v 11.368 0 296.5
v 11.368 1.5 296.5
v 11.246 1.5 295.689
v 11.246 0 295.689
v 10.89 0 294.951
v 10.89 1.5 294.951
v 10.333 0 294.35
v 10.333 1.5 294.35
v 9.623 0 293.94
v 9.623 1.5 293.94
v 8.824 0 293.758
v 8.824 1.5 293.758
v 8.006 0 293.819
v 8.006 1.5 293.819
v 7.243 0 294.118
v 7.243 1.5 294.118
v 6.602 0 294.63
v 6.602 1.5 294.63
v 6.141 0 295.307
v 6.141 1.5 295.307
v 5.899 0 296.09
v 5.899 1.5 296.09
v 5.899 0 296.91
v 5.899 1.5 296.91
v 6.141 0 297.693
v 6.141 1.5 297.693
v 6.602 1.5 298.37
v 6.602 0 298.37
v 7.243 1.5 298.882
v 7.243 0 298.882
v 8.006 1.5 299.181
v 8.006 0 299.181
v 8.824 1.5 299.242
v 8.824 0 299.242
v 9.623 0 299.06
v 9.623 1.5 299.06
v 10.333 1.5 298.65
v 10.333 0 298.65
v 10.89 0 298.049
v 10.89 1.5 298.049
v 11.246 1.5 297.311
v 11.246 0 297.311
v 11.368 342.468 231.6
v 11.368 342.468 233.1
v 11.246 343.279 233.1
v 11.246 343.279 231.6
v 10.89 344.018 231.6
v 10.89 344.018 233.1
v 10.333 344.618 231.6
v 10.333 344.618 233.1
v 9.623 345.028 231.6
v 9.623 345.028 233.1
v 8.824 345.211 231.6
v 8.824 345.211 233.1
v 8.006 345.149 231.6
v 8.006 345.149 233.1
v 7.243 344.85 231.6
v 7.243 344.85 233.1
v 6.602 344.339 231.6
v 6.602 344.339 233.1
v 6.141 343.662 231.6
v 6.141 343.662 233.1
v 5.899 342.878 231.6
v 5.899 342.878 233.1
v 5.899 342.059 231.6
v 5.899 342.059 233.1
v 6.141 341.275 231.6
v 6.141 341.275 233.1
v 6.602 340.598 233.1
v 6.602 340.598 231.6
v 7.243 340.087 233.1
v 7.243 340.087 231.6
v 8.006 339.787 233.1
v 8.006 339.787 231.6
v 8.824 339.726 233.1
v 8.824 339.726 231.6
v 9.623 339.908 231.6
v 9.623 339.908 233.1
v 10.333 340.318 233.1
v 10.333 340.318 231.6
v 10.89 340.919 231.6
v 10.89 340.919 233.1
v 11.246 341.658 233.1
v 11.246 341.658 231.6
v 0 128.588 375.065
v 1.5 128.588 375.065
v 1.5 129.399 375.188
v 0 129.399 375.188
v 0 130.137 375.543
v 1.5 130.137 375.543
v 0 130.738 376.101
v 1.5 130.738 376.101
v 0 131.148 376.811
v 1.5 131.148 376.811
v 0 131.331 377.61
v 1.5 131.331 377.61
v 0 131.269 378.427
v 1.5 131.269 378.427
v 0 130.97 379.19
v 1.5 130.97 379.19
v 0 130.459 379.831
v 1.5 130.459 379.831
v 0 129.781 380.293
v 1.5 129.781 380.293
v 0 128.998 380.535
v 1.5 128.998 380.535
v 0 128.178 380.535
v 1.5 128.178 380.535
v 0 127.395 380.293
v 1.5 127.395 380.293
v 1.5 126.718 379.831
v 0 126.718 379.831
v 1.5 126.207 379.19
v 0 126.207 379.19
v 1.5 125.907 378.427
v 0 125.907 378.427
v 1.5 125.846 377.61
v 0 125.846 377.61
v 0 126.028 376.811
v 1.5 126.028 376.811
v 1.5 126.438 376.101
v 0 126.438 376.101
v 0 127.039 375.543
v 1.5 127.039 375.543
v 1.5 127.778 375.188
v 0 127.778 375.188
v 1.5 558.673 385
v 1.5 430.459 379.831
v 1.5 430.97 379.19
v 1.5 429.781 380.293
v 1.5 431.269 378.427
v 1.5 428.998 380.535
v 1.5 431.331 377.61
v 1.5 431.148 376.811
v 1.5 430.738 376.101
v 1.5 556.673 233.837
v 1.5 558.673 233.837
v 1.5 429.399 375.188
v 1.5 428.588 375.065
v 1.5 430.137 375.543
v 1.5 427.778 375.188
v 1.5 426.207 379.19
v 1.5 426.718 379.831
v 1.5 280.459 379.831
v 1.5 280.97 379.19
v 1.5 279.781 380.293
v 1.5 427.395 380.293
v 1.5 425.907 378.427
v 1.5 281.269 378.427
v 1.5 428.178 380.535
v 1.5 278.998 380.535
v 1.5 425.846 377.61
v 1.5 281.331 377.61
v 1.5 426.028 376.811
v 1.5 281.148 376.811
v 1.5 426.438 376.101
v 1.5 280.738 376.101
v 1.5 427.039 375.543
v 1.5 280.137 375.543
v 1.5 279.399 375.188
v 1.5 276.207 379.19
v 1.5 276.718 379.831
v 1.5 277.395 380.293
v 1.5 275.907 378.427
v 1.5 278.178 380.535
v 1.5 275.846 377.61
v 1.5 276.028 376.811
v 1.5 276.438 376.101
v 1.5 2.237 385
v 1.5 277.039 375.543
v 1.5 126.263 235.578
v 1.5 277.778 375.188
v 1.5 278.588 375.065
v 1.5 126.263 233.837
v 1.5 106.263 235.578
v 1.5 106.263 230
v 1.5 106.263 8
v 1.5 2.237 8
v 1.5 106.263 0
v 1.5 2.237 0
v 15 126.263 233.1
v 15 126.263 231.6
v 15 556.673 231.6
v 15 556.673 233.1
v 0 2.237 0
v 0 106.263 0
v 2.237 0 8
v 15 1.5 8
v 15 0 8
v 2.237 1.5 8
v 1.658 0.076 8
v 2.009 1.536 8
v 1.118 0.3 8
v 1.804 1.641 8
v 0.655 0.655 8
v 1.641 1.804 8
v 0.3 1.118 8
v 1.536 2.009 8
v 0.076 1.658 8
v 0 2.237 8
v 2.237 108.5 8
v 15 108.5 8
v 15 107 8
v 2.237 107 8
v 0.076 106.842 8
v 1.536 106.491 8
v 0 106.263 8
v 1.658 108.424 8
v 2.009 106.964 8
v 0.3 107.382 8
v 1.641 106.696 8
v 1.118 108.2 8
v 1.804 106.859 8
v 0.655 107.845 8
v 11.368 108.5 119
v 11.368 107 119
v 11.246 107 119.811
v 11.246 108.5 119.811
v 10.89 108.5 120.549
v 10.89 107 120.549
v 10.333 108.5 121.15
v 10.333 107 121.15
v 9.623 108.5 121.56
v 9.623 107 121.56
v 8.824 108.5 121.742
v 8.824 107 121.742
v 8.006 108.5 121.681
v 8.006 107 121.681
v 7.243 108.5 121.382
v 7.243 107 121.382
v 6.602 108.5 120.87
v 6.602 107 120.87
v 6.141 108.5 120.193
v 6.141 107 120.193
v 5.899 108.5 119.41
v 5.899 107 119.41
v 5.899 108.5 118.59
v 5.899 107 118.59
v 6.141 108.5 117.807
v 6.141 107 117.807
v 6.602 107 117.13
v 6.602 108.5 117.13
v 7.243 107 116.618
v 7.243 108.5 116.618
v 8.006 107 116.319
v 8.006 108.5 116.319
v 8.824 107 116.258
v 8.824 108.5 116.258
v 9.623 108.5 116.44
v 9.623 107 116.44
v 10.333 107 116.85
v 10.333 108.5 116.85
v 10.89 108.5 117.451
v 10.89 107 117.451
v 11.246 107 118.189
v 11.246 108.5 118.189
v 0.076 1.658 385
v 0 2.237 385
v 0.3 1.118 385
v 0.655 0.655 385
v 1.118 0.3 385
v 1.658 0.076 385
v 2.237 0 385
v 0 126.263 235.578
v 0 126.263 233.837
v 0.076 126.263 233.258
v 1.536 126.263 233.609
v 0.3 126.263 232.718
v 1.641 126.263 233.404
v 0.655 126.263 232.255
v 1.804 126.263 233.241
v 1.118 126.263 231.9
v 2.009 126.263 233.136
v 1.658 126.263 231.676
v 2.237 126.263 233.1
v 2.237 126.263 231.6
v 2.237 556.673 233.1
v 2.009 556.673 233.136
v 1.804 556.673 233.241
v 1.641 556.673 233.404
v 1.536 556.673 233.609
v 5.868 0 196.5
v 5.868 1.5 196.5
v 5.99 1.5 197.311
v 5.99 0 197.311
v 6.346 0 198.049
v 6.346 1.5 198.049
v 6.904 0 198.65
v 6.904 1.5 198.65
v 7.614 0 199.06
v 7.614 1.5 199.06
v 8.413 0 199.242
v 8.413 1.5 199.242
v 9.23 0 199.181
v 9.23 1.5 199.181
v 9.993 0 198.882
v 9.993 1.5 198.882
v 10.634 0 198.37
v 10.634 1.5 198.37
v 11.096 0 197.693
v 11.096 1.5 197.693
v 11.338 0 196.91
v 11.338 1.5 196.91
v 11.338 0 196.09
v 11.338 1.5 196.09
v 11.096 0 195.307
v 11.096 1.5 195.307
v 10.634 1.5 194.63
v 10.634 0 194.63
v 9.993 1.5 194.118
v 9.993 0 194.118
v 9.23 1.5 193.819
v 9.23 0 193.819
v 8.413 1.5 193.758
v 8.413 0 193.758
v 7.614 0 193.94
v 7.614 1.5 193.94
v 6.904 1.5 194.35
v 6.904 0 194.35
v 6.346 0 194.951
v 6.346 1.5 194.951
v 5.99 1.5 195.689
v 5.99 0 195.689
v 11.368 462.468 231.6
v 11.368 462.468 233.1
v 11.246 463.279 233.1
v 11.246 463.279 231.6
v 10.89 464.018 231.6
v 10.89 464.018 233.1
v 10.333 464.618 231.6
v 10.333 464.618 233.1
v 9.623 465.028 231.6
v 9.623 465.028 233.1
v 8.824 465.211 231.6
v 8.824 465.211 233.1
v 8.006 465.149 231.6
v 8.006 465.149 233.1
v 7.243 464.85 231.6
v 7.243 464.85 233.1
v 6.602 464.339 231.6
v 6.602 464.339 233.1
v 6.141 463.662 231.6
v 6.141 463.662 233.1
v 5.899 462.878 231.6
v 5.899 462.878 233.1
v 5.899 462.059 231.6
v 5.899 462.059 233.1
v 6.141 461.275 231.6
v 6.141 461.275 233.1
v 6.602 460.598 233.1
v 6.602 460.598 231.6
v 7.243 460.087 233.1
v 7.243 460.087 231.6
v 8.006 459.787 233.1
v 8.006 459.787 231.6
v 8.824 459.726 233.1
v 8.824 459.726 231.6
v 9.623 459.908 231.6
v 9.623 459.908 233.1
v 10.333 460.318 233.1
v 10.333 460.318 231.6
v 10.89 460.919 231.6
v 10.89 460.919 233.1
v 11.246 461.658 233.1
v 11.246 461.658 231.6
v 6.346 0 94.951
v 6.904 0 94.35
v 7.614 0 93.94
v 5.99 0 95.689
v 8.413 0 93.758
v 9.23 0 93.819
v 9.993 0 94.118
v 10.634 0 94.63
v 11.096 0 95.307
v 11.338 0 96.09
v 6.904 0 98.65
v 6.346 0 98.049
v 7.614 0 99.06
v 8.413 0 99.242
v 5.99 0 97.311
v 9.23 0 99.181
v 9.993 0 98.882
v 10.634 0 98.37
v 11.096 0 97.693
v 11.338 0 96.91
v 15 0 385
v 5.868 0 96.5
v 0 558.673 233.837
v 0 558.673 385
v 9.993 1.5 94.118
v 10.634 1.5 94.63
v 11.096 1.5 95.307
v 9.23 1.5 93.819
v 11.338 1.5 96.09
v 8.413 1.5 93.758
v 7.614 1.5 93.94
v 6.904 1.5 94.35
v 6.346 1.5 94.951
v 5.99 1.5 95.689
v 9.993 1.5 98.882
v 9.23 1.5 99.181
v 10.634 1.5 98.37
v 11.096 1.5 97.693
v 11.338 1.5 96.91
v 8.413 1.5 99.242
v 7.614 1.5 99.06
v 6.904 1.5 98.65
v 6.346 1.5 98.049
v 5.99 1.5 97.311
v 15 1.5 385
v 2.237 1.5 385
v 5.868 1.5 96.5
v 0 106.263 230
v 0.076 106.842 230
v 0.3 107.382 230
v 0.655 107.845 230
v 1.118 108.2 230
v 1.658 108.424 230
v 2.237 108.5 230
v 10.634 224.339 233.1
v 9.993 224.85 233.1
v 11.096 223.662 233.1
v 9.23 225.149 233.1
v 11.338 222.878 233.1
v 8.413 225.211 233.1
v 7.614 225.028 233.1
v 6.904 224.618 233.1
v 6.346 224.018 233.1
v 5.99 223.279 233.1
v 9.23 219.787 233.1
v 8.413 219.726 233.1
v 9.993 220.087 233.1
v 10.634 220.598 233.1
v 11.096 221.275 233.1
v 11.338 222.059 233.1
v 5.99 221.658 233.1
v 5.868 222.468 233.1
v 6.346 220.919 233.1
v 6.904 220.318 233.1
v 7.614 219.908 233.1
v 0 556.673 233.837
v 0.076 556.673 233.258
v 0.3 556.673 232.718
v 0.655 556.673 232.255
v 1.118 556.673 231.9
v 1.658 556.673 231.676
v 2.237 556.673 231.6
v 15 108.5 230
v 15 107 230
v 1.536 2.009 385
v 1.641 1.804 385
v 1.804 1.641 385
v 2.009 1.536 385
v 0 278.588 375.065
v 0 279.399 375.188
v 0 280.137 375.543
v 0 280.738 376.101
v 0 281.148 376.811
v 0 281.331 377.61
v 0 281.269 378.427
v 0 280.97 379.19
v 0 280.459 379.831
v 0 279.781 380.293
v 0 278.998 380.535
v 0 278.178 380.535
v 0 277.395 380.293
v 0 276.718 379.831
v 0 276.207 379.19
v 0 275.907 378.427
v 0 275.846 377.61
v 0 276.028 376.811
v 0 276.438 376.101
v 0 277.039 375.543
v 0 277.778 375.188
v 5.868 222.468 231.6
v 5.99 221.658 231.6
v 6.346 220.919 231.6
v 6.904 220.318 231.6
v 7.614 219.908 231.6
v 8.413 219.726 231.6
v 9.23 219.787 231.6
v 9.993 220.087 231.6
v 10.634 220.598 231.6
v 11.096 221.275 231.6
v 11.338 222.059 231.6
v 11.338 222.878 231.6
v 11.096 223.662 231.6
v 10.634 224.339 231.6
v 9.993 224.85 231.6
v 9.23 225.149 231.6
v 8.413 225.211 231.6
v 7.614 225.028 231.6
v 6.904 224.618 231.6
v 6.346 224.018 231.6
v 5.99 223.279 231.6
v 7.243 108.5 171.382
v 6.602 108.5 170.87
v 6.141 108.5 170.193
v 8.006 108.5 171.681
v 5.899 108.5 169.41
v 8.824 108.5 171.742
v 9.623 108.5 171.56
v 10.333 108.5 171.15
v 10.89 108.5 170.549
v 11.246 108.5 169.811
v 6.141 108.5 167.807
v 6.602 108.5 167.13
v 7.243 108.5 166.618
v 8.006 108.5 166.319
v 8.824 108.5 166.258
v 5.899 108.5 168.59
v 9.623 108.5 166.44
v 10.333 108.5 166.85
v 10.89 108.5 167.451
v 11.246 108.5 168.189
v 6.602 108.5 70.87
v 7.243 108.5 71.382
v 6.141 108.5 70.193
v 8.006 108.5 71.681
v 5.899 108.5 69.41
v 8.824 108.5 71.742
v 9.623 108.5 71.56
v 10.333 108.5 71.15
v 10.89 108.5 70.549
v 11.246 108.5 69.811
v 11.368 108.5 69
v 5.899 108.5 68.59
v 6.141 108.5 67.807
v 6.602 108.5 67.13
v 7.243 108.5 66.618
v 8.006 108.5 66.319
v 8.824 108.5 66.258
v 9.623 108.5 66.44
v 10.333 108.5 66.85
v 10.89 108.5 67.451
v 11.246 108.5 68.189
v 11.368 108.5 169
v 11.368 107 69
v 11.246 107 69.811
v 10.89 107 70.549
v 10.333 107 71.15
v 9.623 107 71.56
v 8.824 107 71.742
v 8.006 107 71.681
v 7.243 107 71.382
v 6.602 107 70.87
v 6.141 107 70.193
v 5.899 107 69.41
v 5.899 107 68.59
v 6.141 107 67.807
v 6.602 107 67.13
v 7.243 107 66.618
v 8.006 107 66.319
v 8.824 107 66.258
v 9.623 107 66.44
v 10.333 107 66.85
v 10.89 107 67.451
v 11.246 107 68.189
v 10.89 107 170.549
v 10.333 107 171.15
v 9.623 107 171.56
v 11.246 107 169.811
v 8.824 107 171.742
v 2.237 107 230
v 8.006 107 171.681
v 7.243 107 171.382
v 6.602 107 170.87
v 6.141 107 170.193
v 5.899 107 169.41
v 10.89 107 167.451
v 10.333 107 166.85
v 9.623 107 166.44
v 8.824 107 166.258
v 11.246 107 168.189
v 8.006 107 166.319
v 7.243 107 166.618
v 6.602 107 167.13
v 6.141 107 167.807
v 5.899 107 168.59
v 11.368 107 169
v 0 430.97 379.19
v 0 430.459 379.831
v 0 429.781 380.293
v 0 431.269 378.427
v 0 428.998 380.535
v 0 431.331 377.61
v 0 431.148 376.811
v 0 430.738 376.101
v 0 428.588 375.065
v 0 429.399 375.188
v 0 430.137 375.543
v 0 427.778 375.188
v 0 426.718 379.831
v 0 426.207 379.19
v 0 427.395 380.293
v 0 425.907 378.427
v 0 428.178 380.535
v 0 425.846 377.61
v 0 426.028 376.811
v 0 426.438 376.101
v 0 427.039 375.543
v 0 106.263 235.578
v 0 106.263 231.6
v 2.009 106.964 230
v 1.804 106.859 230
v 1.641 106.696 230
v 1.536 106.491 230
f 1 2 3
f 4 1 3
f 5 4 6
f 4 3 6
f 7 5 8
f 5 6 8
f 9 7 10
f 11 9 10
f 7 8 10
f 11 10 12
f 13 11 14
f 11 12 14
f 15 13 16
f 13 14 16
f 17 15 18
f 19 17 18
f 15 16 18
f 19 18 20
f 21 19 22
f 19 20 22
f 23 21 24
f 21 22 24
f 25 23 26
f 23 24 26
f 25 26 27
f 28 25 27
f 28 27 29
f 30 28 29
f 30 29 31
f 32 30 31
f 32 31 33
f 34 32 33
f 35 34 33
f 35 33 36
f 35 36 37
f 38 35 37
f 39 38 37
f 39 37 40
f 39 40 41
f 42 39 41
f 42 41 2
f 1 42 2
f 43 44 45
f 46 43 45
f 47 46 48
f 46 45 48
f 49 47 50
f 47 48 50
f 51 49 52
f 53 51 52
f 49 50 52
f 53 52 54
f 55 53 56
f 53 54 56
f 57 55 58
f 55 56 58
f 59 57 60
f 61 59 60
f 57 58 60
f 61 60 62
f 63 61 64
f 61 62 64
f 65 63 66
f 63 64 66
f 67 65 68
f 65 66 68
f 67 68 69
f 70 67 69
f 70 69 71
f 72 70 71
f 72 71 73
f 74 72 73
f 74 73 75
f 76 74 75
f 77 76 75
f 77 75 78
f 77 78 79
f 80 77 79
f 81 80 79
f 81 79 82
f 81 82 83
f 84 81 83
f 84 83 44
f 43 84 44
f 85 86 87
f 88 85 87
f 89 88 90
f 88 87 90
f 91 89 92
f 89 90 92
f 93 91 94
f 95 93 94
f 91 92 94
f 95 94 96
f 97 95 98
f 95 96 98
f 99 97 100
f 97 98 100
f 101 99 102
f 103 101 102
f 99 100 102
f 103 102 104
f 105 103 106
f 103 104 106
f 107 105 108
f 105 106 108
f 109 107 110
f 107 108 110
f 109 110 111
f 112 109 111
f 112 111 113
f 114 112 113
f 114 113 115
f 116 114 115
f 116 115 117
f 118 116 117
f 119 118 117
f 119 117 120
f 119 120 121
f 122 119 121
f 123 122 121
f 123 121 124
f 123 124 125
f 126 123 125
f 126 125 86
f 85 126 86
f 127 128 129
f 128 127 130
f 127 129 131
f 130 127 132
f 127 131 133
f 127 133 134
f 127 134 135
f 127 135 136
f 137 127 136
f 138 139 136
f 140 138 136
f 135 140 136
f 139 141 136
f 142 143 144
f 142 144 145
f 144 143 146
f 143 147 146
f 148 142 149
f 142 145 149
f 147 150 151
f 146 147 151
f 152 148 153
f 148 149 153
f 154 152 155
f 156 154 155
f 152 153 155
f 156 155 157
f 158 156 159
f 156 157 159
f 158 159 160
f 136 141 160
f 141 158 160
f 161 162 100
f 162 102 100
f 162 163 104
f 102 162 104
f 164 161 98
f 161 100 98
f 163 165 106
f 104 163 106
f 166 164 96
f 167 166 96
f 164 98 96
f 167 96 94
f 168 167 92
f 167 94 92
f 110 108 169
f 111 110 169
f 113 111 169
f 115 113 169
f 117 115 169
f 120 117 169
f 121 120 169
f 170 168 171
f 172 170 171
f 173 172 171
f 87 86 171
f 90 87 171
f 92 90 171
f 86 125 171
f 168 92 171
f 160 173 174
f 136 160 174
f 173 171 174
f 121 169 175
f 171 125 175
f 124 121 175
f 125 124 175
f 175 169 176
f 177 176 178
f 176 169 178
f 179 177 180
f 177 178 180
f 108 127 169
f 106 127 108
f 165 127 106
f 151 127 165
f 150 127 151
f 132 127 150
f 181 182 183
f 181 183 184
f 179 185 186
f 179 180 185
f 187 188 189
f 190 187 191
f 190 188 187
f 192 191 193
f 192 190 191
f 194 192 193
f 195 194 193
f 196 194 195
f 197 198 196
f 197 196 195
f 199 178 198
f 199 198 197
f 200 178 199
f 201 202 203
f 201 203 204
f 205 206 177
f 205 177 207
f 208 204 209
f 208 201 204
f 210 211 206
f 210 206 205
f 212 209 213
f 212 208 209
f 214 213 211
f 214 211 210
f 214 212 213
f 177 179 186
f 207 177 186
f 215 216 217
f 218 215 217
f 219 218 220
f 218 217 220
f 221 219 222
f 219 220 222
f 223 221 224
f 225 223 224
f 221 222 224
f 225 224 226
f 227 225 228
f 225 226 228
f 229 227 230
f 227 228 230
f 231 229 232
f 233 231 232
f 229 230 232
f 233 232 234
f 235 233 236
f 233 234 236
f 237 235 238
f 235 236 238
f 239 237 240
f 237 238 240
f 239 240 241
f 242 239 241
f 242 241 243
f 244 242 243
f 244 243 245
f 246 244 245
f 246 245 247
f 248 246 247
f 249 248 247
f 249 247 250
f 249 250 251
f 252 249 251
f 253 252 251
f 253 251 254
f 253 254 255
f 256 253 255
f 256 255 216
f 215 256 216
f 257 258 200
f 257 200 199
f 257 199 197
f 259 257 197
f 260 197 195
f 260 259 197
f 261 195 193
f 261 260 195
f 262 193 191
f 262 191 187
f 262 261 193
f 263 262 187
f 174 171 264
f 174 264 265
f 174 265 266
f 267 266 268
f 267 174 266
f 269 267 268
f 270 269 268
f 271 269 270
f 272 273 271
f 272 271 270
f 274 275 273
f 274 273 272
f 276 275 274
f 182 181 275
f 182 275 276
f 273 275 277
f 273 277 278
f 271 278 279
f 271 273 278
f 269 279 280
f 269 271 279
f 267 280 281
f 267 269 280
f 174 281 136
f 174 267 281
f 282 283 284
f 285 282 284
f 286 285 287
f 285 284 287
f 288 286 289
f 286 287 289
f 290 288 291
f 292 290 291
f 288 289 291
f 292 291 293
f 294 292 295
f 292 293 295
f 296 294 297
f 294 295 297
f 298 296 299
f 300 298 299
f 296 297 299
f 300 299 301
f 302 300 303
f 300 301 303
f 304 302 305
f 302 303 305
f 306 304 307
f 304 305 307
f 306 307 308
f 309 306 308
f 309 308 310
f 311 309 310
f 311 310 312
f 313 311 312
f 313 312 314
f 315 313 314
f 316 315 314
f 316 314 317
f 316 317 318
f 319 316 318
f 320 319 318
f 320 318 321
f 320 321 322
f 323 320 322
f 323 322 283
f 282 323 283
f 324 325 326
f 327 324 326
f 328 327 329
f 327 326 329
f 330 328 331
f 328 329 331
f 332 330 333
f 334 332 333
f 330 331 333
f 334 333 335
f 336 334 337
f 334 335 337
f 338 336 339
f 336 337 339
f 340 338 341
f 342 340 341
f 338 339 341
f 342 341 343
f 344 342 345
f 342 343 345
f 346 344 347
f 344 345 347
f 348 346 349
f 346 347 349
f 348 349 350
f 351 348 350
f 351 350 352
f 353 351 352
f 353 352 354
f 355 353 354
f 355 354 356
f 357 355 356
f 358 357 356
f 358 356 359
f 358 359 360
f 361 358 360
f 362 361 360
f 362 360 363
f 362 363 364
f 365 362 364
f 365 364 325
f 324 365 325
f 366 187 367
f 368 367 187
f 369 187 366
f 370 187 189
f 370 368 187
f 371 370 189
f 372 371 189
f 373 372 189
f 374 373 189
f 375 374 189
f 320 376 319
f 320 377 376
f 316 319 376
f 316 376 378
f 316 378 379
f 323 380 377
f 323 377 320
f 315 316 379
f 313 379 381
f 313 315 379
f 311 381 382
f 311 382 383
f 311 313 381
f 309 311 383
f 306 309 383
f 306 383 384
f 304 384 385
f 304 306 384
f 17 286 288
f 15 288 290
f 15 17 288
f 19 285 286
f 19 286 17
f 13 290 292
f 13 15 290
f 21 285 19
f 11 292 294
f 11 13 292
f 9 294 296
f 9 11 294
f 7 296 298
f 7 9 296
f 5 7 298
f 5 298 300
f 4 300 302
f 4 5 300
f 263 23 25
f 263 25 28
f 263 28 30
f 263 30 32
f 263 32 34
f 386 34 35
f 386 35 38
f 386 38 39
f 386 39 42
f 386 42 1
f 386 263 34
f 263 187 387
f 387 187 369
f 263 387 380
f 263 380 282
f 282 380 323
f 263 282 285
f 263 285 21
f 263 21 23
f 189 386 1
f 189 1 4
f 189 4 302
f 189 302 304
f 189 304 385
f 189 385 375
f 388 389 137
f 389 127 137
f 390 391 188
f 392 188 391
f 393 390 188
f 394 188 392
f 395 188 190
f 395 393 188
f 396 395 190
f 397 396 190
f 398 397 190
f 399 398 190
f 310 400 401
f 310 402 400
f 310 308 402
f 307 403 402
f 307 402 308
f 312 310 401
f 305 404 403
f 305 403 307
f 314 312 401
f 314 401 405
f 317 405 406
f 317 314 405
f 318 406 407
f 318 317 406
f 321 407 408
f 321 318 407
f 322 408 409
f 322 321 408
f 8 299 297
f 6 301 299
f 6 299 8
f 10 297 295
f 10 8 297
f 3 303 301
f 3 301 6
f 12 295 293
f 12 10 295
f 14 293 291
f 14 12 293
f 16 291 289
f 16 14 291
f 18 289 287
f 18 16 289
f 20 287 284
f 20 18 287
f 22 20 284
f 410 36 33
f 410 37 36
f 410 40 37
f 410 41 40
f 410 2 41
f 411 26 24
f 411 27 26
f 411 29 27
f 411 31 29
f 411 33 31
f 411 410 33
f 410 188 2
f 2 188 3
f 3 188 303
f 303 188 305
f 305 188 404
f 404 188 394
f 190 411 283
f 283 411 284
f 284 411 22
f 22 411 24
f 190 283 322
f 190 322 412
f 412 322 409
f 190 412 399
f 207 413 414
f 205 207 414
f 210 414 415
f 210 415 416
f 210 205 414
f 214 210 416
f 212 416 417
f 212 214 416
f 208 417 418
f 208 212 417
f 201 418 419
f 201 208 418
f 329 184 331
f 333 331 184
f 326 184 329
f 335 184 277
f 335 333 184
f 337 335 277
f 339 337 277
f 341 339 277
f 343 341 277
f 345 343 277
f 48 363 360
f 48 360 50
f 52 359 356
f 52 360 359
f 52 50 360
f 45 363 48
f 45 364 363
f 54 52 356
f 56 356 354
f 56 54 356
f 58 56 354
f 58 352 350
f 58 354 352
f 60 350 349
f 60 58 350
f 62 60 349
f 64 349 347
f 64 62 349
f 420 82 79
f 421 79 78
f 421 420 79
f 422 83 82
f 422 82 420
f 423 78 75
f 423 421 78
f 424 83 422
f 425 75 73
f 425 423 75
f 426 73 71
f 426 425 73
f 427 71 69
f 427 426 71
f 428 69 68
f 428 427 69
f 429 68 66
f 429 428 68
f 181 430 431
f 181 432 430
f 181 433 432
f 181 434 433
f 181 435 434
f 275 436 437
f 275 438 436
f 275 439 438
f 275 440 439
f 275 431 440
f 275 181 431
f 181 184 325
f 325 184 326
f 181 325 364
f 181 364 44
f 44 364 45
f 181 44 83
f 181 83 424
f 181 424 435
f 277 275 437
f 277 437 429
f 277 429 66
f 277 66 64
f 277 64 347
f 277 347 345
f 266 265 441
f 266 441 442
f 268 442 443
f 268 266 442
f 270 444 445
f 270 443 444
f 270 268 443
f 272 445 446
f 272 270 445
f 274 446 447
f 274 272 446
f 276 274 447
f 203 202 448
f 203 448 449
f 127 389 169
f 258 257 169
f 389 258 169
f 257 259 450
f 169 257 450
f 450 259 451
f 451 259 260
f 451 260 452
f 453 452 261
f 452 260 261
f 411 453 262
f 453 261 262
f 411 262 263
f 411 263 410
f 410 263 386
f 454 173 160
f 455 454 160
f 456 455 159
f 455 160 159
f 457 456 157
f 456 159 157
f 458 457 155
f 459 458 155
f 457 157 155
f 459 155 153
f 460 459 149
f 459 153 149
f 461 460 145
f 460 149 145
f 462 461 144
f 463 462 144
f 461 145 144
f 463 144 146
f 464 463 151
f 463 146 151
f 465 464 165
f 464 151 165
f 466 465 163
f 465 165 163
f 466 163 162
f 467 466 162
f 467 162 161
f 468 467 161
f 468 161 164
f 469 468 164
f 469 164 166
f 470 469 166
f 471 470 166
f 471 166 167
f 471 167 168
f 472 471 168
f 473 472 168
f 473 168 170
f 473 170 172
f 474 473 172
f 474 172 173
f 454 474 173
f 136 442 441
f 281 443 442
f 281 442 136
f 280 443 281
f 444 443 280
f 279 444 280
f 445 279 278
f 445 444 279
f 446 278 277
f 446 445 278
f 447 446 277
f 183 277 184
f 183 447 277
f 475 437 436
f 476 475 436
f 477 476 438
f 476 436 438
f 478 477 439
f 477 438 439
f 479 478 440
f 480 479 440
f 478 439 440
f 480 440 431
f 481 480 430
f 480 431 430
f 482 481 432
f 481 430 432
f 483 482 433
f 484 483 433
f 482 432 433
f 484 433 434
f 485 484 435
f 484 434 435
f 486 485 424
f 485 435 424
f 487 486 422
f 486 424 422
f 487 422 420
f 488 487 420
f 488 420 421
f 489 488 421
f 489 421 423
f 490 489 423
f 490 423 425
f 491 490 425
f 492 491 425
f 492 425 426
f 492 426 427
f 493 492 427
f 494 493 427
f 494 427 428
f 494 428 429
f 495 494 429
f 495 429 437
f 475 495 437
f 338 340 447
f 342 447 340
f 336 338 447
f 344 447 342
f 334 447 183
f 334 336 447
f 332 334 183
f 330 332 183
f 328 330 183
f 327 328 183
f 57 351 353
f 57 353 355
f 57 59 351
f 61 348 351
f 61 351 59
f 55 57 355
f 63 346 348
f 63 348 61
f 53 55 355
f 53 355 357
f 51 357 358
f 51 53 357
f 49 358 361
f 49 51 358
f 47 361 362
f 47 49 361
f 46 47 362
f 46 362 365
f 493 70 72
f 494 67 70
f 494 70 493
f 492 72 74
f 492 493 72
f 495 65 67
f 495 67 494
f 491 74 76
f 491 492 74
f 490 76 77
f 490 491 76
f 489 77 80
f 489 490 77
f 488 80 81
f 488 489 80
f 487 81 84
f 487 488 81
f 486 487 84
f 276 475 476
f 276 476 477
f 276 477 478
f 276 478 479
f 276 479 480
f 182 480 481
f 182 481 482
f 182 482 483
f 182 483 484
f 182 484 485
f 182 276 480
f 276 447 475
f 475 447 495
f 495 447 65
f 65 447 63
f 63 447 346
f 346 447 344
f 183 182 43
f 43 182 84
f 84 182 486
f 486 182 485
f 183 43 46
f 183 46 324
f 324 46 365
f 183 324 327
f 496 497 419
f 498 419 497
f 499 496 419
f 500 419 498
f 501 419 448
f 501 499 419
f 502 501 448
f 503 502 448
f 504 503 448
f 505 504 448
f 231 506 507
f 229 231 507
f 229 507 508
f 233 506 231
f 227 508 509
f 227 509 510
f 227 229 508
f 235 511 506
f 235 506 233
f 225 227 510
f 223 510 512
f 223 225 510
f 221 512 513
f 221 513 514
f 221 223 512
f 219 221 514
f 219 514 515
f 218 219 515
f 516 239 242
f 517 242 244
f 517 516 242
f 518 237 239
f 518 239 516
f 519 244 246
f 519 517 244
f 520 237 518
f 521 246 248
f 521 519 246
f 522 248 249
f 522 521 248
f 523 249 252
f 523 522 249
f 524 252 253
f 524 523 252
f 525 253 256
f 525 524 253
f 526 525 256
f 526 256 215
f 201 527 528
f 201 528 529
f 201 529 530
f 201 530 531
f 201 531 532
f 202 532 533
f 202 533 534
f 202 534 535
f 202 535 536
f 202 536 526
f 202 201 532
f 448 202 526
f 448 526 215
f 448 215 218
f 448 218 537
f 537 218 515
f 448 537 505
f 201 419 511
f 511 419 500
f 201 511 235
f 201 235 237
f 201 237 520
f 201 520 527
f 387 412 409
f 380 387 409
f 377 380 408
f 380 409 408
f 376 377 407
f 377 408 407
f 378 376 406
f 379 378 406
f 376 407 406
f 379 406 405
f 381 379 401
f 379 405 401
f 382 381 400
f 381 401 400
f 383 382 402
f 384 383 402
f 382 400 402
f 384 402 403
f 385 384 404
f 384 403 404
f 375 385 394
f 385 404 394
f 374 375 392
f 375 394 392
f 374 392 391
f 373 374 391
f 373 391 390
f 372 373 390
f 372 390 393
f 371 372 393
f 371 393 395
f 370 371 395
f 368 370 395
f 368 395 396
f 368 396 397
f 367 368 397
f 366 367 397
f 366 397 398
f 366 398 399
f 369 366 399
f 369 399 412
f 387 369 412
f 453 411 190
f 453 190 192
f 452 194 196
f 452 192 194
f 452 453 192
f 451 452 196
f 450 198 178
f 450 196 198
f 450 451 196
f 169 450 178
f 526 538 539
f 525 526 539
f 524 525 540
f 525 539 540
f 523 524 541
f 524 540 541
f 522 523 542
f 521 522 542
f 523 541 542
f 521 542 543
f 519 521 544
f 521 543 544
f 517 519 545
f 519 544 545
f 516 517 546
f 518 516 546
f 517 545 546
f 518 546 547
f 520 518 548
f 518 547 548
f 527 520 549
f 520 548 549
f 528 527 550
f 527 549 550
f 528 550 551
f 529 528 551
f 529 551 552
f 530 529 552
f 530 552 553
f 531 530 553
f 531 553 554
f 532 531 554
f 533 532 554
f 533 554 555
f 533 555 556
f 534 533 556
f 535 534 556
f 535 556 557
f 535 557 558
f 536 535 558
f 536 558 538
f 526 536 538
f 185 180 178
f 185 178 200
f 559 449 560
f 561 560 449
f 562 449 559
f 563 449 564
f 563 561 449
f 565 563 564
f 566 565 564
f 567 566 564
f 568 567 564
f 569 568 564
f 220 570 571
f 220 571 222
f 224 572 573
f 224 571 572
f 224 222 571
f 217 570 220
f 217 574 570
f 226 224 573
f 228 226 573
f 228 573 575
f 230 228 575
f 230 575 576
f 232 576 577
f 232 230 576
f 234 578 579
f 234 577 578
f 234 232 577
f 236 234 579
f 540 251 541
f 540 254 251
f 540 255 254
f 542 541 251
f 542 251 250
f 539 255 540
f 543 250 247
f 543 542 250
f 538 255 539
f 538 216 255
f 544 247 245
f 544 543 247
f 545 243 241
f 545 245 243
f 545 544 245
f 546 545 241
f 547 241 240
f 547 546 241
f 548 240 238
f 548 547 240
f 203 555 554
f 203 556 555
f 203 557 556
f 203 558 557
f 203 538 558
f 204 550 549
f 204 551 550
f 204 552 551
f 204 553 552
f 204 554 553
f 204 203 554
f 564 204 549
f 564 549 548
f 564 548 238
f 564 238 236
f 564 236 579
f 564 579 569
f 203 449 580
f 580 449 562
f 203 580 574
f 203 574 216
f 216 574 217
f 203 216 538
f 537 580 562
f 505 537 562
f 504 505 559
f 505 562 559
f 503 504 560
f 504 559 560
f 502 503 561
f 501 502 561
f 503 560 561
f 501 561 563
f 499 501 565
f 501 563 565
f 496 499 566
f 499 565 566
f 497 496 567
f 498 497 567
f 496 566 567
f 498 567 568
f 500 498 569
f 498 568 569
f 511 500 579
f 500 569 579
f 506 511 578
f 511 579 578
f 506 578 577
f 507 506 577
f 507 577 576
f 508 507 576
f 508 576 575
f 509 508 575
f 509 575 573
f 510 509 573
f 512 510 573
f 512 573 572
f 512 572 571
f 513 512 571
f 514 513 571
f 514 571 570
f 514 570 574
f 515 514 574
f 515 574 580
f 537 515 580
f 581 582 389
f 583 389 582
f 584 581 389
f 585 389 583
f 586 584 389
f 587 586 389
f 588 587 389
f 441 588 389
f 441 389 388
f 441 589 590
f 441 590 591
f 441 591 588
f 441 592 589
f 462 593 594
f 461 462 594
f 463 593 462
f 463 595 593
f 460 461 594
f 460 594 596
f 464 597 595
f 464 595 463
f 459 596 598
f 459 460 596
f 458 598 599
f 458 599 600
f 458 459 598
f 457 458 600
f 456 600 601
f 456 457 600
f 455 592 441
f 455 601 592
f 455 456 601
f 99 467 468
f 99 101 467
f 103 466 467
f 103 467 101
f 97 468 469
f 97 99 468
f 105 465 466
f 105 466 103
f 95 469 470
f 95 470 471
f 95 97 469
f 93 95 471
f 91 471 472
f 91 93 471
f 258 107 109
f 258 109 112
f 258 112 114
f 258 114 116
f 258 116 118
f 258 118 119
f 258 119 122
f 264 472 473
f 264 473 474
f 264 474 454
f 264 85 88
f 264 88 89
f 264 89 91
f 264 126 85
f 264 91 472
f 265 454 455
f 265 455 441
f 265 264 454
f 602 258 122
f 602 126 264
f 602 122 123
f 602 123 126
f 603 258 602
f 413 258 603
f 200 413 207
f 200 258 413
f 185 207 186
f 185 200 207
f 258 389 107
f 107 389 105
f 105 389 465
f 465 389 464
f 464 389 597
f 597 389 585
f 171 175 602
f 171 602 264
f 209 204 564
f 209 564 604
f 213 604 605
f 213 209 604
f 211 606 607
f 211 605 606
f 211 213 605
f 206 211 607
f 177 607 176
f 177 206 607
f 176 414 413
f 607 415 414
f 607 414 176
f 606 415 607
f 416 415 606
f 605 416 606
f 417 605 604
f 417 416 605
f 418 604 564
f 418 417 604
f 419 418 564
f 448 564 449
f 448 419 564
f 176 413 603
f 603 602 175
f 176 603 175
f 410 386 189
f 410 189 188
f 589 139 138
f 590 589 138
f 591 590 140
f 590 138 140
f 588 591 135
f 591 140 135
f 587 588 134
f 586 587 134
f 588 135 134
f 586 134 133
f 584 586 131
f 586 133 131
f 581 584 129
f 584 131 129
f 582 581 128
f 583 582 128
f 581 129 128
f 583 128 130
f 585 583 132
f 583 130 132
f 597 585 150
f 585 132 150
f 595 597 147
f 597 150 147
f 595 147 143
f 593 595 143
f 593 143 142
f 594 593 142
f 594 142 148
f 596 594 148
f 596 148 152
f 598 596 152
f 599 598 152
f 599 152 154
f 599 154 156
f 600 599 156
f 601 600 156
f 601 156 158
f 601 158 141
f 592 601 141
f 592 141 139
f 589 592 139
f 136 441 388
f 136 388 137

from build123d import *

# Parameters (mm, degrees)
SKETCH_2_W                       = 1.5
SKETCH_2_H                       = 108.5
SM_BASE_FLANGE_1_DEPTH           = 385
SM_EDGE_FLANGE_2_STRIP_W         = 7.4732
SM_EDGE_FLANGE_2_STRIP_H         = 1.5
SM_EDGE_FLANGE_2_STRIP_CUT_DEPTH = 385
SM_EDGE_FLANGE_2_DEPTH           = 385
SKETCH_13_W                      = 19.831026495
SKETCH_13_H                      = 4.393295337
CUT_EXTRUDE_1_DEPTH              = 8
SM_EDGE_FLANGE_3_STRIP_W         = 7.4732
SM_EDGE_FLANGE_3_STRIP_H         = 1.5
SM_EDGE_FLANGE_3_STRIP_CUT_DEPTH = 385
SM_EDGE_FLANGE_3_DEPTH           = 385
SKETCH_18_W                      = 20.05650784
SKETCH_18_H                      = 5.183741357
CUT_EXTRUDE_2_DEPTH              = 8
SKETCH_19_W                      = 25.725423763
SKETCH_19_H                      = 11.342633063
CUT_EXTRUDE_3_DEPTH              = 140
SKETCH_20_W                      = 20.859346665
SKETCH_20_H                      = 6.188811882
CUT_EXTRUDE_4_DEPTH              = 15
SKETCH_21_W                      = 1.5
SKETCH_21_H                      = 153.4
EXTRUDE_1_DEPTH                  = 452.41
SKETCH_22_R                      = 2.75
CUT_EXTRUDE_5_DEPTH              = 20
SKETCH_23_R                      = 2.75
CUT_EXTRUDE_6_DEPTH              = 20
SKETCH_24_R                      = 2.75
CUT_EXTRUDE_7_DEPTH              = 20
SKETCH_28_W                      = 3.977690792
SKETCH_28_H                      = 20
CUT_EXTRUDE_8_DEPTH              = 10
SM_EDGE_FLANGE_5_STRIP_W         = 7.4732
SM_EDGE_FLANGE_5_STRIP_H         = 1.5
SM_EDGE_FLANGE_5_STRIP_CUT_DEPTH = 432.41
SM_EDGE_FLANGE_5_DEPTH           = 432.41
SKETCH_32_R                      = 2.75
CUT_EXTRUDE_9_DEPTH              = 10
CUT_EXTRUDE_START                = -2
CUT_EXTRUDE_10_DEPTH             = 2


# Read off the part's stored shape, not the designer's step: 切除-拉伸10
# Sheet-metal steps are written as plain solids
with BuildPart() as part:
    # Sketch 2 → 基体-法兰1 (new body)
    with BuildSketch(Plane.XY):
        with Locations((0.75, 54.25)):
            Rectangle(SKETCH_2_W, SKETCH_2_H)
    extrude(amount=SM_BASE_FLANGE_1_DEPTH)

    # 边线-法兰2 strip (across the edge) → 边线-法兰2 strip cut (cut)
    with BuildSketch(Plane(origin=(1.5, 0, 385), x_dir=(0, 1, 0), z_dir=(0, 0, -1))):
        with Locations((-1.5, -0.75)):
            Rectangle(SM_EDGE_FLANGE_2_STRIP_W, SM_EDGE_FLANGE_2_STRIP_H)
    extrude(amount=SM_EDGE_FLANGE_2_STRIP_CUT_DEPTH, mode=Mode.SUBTRACT)

    # 边线-法兰2 section (across the edge) → 边线-法兰2 (add)
    with BuildSketch(Plane(origin=(1.5, 0, 385), x_dir=(0, 1, 0), z_dir=(0, 0, -1))):
        with BuildLine():
            Line((0, 0.7366), (0, 13.5))
            Line((0, 13.5), (1.5, 13.5))
            Line((1.5, 13.5), (1.5, 0.7366))
            ThreePointArc((1.5, 0.7366), (1.715745145, 0.215745145), (2.2366, 0))
            Line((2.2366, 0), (2.2366, -1.5))
            ThreePointArc((2.2366, -1.5), (0.655084973, -0.844915027), (0, 0.7366))
        make_face()
    extrude(amount=SM_EDGE_FLANGE_2_DEPTH)

    # 草图13 → 切除-拉伸1 (cut)
    with BuildSketch(Plane(origin=(0, 0, 0), x_dir=(-1, 0, 0), z_dir=(0, 0, -1))):
        with Locations((-9.915513247, 0.039952332)):
            Rectangle(SKETCH_13_W, SKETCH_13_H)
    extrude(amount=-CUT_EXTRUDE_1_DEPTH, mode=Mode.SUBTRACT)

    # 边线-法兰3 strip (across the edge) → 边线-法兰3 strip cut (cut)
    with BuildSketch(Plane(origin=(1.5, 108.5, 0), x_dir=(0, -1, 0), z_dir=(0, 0, 1))):
        with Locations((-1.5, -0.75)):
            Rectangle(SM_EDGE_FLANGE_3_STRIP_W, SM_EDGE_FLANGE_3_STRIP_H)
    extrude(amount=SM_EDGE_FLANGE_3_STRIP_CUT_DEPTH, mode=Mode.SUBTRACT)

    # 边线-法兰3 section (across the edge) → 边线-法兰3 (add)
    with BuildSketch(Plane(origin=(1.5, 108.5, 0), x_dir=(0, -1, 0), z_dir=(0, 0, 1))):
        with BuildLine():
            Line((0, 0.7366), (0, 13.5))
            Line((0, 13.5), (1.5, 13.5))
            Line((1.5, 13.5), (1.5, 0.7366))
            ThreePointArc((1.5, 0.7366), (1.715745145, 0.215745145), (2.2366, 0))
            Line((2.2366, 0), (2.2366, -1.5))
            ThreePointArc((2.2366, -1.5), (0.655084973, -0.844915027), (0, 0.7366))
        make_face()
    extrude(amount=SM_EDGE_FLANGE_3_DEPTH)

    # 草图18 → 切除-拉伸2 (cut)
    with BuildSketch(Plane(origin=(0, 0, 0), x_dir=(-1, 0, 0), z_dir=(0, 0, -1))):
        with Locations((-10.02825392, 108.855270679)):
            Rectangle(SKETCH_18_W, SKETCH_18_H)
    extrude(amount=-CUT_EXTRUDE_2_DEPTH, mode=Mode.SUBTRACT)

    # 草图19 → 切除-拉伸3 (cut)
    with BuildSketch(Plane.XY.offset(385)):
        with Locations((12.862711882, 111.934716532)):
            Rectangle(SKETCH_19_W, SKETCH_19_H)
    extrude(amount=-CUT_EXTRUDE_3_DEPTH, mode=Mode.SUBTRACT)

    # 草图20 → 切除-拉伸4 (cut)
    with BuildSketch(Plane.XY.offset(245)):
        with Locations((10.429673333, 109.357805941)):
            Rectangle(SKETCH_20_W, SKETCH_20_H)
    extrude(amount=-CUT_EXTRUDE_4_DEPTH, mode=Mode.SUBTRACT)

    # 草图21 → 凸台-拉伸1 (add)
    with BuildSketch(Plane(origin=(0, 106.2634, 0), x_dir=(1, 0, 0), z_dir=(0, 1, 0))):
        with Locations((0.75, -308.3)):
            Rectangle(SKETCH_21_W, SKETCH_21_H)
    extrude(amount=EXTRUDE_1_DEPTH)

    # 草图22 → 切除-拉伸5 (cut)
    with BuildSketch(Plane.XZ.offset(-107)):
        with Locations((8.6183, 69)):
            Circle(SKETCH_22_R)
        with Locations((8.6183, 169)):
            Circle(SKETCH_22_R)
        with Locations((8.6183, 119)):
            Circle(SKETCH_22_R)
    extrude(amount=-CUT_EXTRUDE_5_DEPTH, mode=Mode.SUBTRACT)

    # 草图23 → 切除-拉伸6 (cut)
    with BuildSketch(Plane(origin=(0, 1.5, 0), x_dir=(1, 0, 0), z_dir=(0, 1, 0))):
        with Locations(Location((8.6183, -96.5, 0), (0, 0, 180))):
            Circle(SKETCH_23_R)
        with Locations(Location((8.6183, -196.5, 0), (0, 0, 180))):
            Circle(SKETCH_23_R)
        with Locations((8.6183, -296.5)):
            Circle(SKETCH_23_R)
    extrude(amount=-CUT_EXTRUDE_6_DEPTH, mode=Mode.SUBTRACT)

    # 草图24 → 切除-拉伸7 (cut)
    with BuildSketch(Plane(origin=(1.5, 0, 0), x_dir=(0, 0, -1), z_dir=(1, 0, 0))):
        with Locations((-377.815462169, 128.5882)):
            Circle(SKETCH_24_R)
        with Locations((-377.815462169, 278.5882)):
            Circle(SKETCH_24_R)
        with Locations((-377.815462169, 428.5882)):
            Circle(SKETCH_24_R)
    extrude(amount=-CUT_EXTRUDE_7_DEPTH, mode=Mode.SUBTRACT)

    # 草图28 → 切除-拉伸8 (cut)
    with BuildSketch(Plane(origin=(1.5, 0, 0), x_dir=(0, 0, -1), z_dir=(1, 0, 0))):
        with Locations((-233.588845396, 116.2634)):
            Rectangle(SKETCH_28_W, SKETCH_28_H)
    extrude(amount=-CUT_EXTRUDE_8_DEPTH, mode=Mode.SUBTRACT)

    # 边线-法兰5 strip (across the edge) → 边线-法兰5 strip cut (cut)
    with BuildSketch(Plane(origin=(1.5, 126.2634, 231.6), x_dir=(0, 0, 1), z_dir=(0, 1, 0))):
        with Locations((-1.5, -0.75)):
            Rectangle(SM_EDGE_FLANGE_5_STRIP_W, SM_EDGE_FLANGE_5_STRIP_H)
    extrude(amount=SM_EDGE_FLANGE_5_STRIP_CUT_DEPTH, mode=Mode.SUBTRACT)

    # 边线-法兰5 section (across the edge) → 边线-法兰5 (add)
    with BuildSketch(Plane(origin=(1.5, 126.2634, 231.6), x_dir=(0, 0, 1), z_dir=(0, 1, 0))):
        with BuildLine():
            Line((0, 0.7366), (0, 13.5))
            Line((0, 13.5), (1.5, 13.5))
            Line((1.5, 13.5), (1.5, 0.7366))
            ThreePointArc((1.5, 0.7366), (1.715745145, 0.215745145), (2.2366, 0))
            Line((2.2366, 0), (2.2366, -1.5))
            ThreePointArc((2.2366, -1.5), (0.655084973, -0.844915027), (0, 0.7366))
        make_face()
    extrude(amount=SM_EDGE_FLANGE_5_DEPTH)

    # 草图32 → 切除-拉伸9 (cut)
    with BuildSketch(Plane.XY.offset(233.1)):
        with Locations((8.6183, 462.4684)):
            Circle(SKETCH_32_R)
        with Locations((8.6183, 342.4684)):
            Circle(SKETCH_32_R)
        with Locations(Location((8.6183, 222.4684, 0), (0, 0, 180))):
            Circle(SKETCH_32_R)
    extrude(amount=-CUT_EXTRUDE_9_DEPTH, mode=Mode.SUBTRACT)

    # 切除-拉伸10 outline → 切除-拉伸10 (cut)
    with BuildSketch(Plane(origin=(0, 558.6734, 0), x_dir=(1, 0, 0), z_dir=(0, 1, 0)).offset(CUT_EXTRUDE_START)):
        with BuildLine():
            ThreePointArc((2.2366, -231.6), (0.655084973, -232.255084973), (0, -233.8366))
            Line((0, -233.8366), (1.5, -233.8366))
            ThreePointArc((1.5, -233.8366), (1.715745145, -233.315745145), (2.2366, -233.1))
            Line((2.2366, -233.1), (15, -233.1))
            Line((15, -233.1), (15, -231.6))
            Line((15, -231.6), (2.2366, -231.6))
        make_face()
    extrude(amount=CUT_EXTRUDE_10_DEPTH, mode=Mode.SUBTRACT)


solid = part.part
